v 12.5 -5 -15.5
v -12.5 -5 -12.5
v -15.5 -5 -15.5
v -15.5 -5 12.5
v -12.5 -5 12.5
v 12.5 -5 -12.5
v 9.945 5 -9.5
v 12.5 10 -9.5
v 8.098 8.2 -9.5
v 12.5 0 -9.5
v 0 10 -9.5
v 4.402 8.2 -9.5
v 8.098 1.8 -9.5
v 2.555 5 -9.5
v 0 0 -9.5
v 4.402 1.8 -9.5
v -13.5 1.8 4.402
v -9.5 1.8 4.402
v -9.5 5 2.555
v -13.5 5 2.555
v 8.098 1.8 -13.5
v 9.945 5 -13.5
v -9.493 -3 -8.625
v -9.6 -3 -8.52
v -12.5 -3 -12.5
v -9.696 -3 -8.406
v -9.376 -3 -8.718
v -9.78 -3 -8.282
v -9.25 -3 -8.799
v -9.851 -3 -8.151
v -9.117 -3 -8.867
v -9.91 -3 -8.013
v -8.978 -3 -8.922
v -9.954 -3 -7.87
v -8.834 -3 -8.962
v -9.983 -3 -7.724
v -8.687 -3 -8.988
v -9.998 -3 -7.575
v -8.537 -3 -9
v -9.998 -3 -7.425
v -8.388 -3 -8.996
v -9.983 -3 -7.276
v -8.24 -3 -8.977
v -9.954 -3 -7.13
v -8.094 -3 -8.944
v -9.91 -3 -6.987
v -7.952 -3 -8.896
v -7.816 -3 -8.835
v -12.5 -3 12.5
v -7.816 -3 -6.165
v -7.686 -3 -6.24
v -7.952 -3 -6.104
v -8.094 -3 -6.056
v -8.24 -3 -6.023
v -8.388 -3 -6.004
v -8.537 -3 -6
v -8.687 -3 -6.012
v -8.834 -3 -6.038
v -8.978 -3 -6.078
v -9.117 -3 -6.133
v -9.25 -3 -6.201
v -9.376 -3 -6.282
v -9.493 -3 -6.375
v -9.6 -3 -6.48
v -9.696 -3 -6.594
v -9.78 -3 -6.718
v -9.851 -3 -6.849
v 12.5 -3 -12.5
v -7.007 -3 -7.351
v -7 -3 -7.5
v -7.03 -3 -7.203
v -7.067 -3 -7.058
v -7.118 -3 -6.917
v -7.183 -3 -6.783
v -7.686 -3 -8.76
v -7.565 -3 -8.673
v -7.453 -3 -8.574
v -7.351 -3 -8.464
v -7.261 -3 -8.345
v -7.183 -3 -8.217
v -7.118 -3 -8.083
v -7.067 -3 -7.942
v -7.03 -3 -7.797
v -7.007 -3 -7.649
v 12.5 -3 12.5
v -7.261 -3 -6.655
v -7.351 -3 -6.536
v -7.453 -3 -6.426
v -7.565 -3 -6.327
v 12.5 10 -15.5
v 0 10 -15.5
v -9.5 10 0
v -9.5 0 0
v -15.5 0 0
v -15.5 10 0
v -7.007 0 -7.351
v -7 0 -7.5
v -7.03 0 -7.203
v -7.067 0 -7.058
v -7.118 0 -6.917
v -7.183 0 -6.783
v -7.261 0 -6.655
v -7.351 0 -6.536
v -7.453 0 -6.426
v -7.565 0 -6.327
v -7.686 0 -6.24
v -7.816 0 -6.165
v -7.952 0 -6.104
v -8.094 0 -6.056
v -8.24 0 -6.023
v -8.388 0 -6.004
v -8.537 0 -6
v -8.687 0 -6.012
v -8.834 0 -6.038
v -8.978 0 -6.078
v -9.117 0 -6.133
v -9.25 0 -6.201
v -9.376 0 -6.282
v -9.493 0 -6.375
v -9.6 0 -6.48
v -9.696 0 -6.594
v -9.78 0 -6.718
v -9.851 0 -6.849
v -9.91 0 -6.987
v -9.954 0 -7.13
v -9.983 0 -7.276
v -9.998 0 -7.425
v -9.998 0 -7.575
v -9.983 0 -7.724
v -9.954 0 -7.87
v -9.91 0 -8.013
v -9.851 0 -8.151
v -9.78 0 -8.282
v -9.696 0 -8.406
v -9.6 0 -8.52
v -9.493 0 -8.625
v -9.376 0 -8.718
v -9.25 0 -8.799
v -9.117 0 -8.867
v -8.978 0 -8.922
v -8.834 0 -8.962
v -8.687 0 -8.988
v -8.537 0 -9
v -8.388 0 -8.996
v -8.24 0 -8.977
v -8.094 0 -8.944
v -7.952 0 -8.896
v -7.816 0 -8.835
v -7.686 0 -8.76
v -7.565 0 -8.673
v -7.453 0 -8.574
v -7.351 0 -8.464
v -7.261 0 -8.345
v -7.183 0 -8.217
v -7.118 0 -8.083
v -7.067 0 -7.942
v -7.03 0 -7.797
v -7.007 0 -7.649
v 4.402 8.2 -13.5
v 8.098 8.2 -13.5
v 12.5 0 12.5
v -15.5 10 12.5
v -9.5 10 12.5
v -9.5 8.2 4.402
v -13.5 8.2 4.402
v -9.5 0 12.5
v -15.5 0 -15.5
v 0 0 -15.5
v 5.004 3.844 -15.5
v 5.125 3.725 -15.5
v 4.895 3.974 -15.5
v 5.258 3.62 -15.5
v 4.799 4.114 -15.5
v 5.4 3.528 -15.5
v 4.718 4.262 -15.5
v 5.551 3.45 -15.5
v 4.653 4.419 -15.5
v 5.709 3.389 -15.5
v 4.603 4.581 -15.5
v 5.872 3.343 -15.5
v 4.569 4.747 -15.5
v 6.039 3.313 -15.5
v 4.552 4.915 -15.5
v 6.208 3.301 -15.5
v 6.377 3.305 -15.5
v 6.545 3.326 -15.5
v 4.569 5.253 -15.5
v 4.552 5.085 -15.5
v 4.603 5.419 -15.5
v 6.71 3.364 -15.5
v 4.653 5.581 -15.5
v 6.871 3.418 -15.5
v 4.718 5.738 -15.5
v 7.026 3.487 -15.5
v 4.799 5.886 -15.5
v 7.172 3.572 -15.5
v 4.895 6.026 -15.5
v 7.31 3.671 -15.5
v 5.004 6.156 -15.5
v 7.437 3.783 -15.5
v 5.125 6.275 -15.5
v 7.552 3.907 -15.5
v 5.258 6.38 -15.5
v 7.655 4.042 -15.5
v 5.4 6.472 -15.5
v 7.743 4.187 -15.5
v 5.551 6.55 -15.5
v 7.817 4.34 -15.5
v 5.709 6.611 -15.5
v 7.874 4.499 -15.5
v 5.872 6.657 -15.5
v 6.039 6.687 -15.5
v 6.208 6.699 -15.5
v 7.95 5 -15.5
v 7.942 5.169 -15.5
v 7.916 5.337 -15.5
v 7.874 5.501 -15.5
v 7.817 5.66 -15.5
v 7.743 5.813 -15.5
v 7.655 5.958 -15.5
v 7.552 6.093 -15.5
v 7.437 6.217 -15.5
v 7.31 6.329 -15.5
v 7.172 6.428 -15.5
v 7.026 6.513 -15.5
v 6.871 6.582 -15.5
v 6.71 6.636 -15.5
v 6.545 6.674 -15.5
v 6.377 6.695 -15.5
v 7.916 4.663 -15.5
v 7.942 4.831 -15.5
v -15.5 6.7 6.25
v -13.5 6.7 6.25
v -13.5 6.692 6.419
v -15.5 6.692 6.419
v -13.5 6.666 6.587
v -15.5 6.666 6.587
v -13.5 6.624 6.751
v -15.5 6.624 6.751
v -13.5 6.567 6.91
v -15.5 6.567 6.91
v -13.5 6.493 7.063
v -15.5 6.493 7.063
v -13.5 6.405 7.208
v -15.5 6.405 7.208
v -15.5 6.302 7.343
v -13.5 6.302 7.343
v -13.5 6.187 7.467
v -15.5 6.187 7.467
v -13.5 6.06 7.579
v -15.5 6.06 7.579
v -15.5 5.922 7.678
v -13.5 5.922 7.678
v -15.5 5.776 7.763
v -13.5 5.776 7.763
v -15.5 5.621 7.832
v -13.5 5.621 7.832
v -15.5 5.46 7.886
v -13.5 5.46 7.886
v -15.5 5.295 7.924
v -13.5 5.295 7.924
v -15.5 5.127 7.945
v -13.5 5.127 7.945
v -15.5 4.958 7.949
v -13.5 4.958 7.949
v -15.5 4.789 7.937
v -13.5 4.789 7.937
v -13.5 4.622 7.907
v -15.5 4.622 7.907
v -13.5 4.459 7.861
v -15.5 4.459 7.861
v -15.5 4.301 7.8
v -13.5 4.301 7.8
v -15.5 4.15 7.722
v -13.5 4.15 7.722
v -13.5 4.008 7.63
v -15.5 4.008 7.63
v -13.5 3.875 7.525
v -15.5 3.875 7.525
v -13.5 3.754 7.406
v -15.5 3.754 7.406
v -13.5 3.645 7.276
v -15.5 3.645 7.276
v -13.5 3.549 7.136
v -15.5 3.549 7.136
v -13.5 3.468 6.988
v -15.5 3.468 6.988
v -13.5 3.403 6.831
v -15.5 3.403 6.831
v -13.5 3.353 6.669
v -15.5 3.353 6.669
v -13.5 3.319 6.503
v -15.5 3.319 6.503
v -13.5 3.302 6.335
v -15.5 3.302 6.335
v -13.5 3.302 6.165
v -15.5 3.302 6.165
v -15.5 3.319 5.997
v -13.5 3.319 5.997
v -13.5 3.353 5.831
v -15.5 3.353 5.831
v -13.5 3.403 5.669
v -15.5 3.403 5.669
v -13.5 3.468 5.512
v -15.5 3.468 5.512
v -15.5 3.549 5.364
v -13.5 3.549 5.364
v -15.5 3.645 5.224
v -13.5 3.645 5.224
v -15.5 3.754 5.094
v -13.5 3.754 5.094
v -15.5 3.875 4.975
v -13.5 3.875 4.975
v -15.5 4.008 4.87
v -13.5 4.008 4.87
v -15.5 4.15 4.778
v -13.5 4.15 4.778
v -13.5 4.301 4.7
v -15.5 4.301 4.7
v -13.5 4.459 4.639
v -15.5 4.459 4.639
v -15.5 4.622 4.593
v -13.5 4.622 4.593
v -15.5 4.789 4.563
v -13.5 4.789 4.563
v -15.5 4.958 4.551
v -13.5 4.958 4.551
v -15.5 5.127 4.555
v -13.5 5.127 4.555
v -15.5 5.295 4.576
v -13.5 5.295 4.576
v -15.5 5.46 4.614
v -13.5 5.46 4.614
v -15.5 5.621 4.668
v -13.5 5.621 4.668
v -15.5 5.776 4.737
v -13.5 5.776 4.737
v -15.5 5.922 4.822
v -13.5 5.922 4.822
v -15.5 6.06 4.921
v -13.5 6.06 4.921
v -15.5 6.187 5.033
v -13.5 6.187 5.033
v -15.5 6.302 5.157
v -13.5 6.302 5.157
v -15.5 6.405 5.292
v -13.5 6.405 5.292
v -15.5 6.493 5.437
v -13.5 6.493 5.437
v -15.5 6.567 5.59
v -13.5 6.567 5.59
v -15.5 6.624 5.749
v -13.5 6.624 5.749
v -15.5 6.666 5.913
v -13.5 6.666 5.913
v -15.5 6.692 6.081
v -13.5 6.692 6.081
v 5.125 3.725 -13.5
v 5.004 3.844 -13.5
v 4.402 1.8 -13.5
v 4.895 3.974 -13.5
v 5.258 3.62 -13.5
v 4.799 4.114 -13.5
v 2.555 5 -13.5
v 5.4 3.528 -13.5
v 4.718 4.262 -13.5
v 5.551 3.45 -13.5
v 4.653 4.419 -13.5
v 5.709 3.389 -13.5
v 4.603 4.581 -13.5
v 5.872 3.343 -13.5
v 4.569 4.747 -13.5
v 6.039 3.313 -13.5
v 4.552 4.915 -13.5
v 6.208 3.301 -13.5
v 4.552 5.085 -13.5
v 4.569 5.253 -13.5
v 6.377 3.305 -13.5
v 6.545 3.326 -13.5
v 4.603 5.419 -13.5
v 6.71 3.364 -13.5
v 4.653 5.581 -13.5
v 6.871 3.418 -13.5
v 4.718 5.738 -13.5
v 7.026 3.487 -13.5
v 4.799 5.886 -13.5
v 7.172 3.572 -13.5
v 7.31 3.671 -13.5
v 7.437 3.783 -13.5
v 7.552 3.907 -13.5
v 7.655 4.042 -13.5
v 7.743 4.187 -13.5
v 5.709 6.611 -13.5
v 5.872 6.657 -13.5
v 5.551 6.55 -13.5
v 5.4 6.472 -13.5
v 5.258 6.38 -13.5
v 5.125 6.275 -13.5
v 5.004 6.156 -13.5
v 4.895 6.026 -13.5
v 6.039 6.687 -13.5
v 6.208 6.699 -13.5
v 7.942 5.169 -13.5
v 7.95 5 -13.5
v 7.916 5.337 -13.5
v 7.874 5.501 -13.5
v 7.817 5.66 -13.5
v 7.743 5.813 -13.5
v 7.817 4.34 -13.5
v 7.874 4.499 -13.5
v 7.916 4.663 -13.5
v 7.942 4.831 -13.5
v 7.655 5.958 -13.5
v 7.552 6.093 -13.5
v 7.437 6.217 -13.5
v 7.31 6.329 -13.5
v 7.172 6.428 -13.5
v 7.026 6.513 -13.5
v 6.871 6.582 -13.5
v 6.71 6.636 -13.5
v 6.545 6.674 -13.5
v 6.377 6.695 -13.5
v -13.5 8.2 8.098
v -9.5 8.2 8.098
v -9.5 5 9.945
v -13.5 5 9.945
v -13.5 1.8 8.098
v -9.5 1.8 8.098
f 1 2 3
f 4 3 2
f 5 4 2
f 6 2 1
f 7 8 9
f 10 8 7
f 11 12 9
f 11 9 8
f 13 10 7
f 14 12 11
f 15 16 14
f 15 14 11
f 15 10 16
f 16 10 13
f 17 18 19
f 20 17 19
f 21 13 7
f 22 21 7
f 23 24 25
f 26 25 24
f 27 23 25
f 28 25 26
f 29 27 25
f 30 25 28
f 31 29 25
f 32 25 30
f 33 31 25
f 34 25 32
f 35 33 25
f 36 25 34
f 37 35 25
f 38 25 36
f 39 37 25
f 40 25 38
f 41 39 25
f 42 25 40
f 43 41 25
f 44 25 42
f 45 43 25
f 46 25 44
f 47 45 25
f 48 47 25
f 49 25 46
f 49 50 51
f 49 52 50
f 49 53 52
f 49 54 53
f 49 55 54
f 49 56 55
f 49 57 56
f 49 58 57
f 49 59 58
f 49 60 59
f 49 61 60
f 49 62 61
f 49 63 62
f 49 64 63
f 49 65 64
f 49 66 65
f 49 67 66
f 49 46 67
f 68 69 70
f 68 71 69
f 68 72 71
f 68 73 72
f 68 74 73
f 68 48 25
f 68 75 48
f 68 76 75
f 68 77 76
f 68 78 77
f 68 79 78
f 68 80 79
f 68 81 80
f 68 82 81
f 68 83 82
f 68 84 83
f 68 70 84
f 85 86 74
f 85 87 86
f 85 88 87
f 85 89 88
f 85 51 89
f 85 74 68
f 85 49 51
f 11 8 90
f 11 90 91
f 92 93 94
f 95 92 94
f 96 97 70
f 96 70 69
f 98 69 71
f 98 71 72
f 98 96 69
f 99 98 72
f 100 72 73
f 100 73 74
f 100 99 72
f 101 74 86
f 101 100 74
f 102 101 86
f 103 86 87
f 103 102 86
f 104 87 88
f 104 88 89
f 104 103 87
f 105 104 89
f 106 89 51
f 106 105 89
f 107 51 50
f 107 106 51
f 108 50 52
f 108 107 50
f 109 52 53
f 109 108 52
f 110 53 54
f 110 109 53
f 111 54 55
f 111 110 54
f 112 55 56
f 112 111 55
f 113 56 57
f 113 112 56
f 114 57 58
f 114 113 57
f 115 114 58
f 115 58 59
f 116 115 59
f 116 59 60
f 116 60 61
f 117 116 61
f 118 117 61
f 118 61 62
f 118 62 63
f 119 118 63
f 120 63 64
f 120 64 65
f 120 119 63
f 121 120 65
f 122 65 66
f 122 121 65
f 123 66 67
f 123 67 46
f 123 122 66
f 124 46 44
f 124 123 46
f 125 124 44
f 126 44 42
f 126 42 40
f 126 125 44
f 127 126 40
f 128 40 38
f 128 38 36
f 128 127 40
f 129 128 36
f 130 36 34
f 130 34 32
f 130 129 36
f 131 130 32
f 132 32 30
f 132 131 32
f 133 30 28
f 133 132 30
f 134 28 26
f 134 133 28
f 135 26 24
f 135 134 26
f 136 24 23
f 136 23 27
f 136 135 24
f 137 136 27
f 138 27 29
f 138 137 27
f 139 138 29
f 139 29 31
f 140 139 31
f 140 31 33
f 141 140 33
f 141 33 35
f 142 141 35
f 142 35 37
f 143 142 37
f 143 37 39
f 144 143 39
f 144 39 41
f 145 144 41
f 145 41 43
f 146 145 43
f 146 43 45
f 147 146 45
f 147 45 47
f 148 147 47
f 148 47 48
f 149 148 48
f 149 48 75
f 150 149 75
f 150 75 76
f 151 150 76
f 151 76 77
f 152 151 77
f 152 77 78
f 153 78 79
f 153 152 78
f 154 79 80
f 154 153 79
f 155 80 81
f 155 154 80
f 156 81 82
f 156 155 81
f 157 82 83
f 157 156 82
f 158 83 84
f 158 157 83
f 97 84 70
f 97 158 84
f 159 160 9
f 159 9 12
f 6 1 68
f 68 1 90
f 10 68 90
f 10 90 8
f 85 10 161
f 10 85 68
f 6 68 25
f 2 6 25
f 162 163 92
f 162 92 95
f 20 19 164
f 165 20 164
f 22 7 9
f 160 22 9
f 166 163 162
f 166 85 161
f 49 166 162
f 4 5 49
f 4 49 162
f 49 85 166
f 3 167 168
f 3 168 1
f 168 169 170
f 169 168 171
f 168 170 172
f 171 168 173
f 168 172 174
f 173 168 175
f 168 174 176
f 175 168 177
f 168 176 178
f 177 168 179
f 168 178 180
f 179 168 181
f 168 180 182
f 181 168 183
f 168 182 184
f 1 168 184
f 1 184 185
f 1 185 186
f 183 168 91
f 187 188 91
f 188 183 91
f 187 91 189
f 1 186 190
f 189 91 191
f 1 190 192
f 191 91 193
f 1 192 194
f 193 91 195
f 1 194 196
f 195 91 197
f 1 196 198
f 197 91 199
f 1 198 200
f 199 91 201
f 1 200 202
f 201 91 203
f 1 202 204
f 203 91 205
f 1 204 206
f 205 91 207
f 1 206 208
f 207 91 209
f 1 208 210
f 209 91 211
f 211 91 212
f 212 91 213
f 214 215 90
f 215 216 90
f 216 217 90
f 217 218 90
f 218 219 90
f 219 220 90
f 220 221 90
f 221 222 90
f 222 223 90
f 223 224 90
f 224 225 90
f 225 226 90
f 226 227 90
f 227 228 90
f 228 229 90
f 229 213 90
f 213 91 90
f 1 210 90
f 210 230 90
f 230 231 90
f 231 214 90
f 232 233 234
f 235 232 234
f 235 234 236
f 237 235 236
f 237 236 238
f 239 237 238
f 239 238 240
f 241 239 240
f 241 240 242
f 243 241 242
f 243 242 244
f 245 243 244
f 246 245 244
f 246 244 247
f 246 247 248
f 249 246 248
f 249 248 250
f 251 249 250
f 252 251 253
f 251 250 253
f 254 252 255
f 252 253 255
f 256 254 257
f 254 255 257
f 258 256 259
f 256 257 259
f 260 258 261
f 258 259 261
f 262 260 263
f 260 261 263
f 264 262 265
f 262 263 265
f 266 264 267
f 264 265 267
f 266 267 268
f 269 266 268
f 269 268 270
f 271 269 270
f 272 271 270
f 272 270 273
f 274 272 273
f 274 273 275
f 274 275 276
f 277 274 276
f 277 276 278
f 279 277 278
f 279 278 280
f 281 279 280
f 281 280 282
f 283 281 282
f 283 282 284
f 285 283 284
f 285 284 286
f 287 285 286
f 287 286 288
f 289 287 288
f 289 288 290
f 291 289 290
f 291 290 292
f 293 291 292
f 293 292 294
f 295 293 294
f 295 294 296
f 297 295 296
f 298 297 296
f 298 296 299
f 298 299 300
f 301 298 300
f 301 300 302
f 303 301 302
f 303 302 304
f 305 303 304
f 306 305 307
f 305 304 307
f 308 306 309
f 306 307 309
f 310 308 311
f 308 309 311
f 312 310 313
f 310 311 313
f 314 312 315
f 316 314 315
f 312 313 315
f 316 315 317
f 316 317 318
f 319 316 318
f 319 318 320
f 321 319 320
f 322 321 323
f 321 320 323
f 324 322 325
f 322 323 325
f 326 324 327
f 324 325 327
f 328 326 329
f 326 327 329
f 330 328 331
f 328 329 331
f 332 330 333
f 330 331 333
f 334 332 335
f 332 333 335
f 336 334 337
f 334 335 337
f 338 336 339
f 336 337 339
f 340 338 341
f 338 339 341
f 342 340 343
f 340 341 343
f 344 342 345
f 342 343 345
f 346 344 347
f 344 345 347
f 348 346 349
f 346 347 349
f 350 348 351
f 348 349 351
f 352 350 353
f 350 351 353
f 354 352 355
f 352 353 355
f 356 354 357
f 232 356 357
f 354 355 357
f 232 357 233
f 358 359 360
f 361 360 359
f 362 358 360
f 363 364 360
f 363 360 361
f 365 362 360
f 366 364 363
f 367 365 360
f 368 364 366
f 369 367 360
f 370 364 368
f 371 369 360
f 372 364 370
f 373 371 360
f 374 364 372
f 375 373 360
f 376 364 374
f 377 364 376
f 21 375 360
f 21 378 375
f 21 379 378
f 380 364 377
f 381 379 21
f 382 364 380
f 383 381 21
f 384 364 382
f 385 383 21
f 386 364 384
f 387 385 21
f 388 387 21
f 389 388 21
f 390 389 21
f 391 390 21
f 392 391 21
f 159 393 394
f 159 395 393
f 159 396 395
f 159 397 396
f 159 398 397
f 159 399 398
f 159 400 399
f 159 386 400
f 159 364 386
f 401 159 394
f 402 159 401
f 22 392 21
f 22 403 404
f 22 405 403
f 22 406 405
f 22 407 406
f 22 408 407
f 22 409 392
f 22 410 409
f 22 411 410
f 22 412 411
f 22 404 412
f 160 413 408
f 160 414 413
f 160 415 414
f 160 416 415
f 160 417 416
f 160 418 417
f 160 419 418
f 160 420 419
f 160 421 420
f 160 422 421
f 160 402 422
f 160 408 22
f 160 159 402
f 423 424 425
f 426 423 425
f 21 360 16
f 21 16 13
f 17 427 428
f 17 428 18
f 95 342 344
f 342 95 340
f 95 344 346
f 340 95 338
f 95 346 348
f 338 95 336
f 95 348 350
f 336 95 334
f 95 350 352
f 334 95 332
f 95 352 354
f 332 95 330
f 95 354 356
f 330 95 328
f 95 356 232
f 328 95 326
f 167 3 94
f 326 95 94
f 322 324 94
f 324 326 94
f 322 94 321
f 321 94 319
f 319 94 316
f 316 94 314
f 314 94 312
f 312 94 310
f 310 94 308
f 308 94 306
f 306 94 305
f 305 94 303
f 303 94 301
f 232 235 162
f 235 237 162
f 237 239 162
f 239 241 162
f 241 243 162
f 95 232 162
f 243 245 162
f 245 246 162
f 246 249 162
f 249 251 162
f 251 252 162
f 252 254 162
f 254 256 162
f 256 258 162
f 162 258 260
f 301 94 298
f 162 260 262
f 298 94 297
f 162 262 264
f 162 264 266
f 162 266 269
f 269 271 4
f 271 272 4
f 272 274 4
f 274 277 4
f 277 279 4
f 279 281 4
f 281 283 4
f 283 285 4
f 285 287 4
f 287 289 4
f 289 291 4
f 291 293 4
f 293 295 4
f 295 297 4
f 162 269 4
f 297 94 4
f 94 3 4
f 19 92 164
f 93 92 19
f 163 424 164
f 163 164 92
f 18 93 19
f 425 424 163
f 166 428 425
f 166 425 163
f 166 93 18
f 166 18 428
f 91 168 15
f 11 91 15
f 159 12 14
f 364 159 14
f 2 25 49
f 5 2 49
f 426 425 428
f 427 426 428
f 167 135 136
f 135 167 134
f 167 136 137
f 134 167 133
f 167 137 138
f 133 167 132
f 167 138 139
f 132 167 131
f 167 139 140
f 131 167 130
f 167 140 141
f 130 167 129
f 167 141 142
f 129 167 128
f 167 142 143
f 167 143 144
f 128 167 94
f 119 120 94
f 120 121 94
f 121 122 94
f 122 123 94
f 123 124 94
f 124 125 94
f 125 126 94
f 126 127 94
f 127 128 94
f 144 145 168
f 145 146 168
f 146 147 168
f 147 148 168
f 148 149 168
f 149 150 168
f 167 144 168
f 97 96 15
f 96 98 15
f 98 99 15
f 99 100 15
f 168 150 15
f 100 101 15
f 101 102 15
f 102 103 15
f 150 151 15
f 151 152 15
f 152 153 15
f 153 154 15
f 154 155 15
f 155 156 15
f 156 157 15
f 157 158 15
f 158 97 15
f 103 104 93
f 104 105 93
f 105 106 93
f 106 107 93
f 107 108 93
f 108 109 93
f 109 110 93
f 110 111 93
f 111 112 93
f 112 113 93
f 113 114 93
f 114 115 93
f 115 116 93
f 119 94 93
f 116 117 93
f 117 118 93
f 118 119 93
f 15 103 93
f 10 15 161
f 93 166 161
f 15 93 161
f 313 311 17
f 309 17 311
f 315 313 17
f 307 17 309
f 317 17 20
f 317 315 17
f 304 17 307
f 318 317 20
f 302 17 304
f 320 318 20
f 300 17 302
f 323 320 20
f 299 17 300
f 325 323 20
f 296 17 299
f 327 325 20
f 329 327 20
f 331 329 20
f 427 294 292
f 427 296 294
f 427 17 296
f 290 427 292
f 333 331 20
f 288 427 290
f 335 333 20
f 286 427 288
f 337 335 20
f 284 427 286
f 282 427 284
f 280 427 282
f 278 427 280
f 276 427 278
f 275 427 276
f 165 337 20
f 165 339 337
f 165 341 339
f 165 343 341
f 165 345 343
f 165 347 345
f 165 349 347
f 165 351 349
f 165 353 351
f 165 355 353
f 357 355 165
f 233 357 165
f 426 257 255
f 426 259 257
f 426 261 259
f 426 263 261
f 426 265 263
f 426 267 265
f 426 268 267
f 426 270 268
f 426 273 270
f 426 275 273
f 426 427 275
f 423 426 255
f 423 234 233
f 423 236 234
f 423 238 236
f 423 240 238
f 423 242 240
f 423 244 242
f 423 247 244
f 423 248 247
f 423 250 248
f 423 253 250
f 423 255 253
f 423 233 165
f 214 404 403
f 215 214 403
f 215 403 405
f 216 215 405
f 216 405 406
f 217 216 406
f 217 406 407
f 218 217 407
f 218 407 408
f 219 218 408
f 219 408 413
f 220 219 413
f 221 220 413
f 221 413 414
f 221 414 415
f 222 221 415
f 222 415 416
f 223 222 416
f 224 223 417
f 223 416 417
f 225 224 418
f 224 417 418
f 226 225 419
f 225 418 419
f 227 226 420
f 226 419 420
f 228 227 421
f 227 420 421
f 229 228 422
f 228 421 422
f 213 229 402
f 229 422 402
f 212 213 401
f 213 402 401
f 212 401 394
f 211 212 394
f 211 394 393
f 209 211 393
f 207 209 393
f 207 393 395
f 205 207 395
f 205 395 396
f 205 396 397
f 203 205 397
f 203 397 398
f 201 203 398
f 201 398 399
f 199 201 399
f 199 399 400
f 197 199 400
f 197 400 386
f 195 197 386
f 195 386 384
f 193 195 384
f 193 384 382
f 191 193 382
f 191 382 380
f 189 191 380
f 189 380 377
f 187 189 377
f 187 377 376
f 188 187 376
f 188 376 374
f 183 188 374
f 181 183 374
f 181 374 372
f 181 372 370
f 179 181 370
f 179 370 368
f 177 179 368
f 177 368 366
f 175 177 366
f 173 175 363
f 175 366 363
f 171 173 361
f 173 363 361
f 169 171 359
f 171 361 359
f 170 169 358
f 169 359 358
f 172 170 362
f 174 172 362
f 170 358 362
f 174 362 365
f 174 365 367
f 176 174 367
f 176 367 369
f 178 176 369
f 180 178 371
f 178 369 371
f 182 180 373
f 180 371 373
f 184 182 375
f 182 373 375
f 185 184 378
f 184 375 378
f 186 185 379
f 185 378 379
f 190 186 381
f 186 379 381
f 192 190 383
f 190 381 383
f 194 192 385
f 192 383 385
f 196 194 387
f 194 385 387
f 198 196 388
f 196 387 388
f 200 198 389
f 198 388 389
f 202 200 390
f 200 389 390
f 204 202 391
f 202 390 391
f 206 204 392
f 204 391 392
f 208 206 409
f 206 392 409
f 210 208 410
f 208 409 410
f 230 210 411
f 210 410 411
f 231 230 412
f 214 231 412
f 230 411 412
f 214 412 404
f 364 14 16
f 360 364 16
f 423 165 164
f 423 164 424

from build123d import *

# Parameters (mm, degrees)
F0_W      = 25
F0_H      = 25
F0_R      = 1.5
F1_DEPTH  = 3
F3_DEPTH  = 5
F4_W      = 6
F4_H      = 12.5
F4_W_2    = 12.5
F4_H_2    = 6
F5_DEPTH  = 10
F7_DEPTH  = 4
F8_R      = 1.7
F9_DEPTH  = 25
F11_DEPTH = 4
F12_R     = 1.7
F13_DEPTH = 25


with BuildPart() as f1:
    # F0 (on Front) → F1 (new body)
    with BuildSketch(Plane.XZ):
        Rectangle(F0_W, F0_H)
        with Locations((-8.5, -7.5)):
            Circle(F0_R, mode=Mode.SUBTRACT)
    extrude(amount=F1_DEPTH)

    # F2 (on Front) → F3 (join)
    with BuildSketch(Plane.XZ):
        Polygon((-12.5, -12.5), (-12.5, 12.5), (-15.5, 12.5), (-15.5, -15.5), (12.5, -15.5), (12.5, -12.5), align=None)
    extrude(amount=F3_DEPTH)

    # F4 (on face) → F5 (join)
    with BuildSketch(Plane(origin=(0, 0, 0), x_dir=(-1, 0, 0), z_dir=(0, 1, 0))):
        with Locations((12.5, 6.25)):
            Rectangle(F4_W, F4_H)
        with Locations((-6.25, -12.5)):
            Rectangle(F4_W_2, F4_H_2)
    extrude(amount=F5_DEPTH)

    # F6 (on face) → F7 (cut)
    with BuildSketch(Plane.XY.offset(-9.5)):
        Polygon((8.097521, 1.8), (9.945042, 5), (8.097521, 8.2), (4.402479, 8.2), (2.554958, 5), (4.402479, 1.8), align=None)
    extrude(amount=-F7_DEPTH, mode=Mode.SUBTRACT)

    # F8 (on face) → F9 (cut)
    with BuildSketch(Plane.XY.offset(-9.5)):
        with Locations((6.25, 5)):
            Circle(F8_R)
    extrude(amount=-F9_DEPTH, mode=Mode.SUBTRACT)

    # F10 (on face) → F11 (cut)
    with BuildSketch(Plane.YZ.offset(-9.5)):
        Polygon((8.2, 4.402479), (8.2, 8.097521), (5, 9.945042), (1.8, 8.097521), (1.8, 4.402479), (5, 2.554958), align=None)
    extrude(amount=-F11_DEPTH, mode=Mode.SUBTRACT)

    # F12 (on face) → F13 (cut)
    with BuildSketch(Plane.YZ.offset(-9.5)):
        with Locations((5, 6.25)):
            Circle(F12_R)
    extrude(amount=-F13_DEPTH, mode=Mode.SUBTRACT)


solid = f1.part
